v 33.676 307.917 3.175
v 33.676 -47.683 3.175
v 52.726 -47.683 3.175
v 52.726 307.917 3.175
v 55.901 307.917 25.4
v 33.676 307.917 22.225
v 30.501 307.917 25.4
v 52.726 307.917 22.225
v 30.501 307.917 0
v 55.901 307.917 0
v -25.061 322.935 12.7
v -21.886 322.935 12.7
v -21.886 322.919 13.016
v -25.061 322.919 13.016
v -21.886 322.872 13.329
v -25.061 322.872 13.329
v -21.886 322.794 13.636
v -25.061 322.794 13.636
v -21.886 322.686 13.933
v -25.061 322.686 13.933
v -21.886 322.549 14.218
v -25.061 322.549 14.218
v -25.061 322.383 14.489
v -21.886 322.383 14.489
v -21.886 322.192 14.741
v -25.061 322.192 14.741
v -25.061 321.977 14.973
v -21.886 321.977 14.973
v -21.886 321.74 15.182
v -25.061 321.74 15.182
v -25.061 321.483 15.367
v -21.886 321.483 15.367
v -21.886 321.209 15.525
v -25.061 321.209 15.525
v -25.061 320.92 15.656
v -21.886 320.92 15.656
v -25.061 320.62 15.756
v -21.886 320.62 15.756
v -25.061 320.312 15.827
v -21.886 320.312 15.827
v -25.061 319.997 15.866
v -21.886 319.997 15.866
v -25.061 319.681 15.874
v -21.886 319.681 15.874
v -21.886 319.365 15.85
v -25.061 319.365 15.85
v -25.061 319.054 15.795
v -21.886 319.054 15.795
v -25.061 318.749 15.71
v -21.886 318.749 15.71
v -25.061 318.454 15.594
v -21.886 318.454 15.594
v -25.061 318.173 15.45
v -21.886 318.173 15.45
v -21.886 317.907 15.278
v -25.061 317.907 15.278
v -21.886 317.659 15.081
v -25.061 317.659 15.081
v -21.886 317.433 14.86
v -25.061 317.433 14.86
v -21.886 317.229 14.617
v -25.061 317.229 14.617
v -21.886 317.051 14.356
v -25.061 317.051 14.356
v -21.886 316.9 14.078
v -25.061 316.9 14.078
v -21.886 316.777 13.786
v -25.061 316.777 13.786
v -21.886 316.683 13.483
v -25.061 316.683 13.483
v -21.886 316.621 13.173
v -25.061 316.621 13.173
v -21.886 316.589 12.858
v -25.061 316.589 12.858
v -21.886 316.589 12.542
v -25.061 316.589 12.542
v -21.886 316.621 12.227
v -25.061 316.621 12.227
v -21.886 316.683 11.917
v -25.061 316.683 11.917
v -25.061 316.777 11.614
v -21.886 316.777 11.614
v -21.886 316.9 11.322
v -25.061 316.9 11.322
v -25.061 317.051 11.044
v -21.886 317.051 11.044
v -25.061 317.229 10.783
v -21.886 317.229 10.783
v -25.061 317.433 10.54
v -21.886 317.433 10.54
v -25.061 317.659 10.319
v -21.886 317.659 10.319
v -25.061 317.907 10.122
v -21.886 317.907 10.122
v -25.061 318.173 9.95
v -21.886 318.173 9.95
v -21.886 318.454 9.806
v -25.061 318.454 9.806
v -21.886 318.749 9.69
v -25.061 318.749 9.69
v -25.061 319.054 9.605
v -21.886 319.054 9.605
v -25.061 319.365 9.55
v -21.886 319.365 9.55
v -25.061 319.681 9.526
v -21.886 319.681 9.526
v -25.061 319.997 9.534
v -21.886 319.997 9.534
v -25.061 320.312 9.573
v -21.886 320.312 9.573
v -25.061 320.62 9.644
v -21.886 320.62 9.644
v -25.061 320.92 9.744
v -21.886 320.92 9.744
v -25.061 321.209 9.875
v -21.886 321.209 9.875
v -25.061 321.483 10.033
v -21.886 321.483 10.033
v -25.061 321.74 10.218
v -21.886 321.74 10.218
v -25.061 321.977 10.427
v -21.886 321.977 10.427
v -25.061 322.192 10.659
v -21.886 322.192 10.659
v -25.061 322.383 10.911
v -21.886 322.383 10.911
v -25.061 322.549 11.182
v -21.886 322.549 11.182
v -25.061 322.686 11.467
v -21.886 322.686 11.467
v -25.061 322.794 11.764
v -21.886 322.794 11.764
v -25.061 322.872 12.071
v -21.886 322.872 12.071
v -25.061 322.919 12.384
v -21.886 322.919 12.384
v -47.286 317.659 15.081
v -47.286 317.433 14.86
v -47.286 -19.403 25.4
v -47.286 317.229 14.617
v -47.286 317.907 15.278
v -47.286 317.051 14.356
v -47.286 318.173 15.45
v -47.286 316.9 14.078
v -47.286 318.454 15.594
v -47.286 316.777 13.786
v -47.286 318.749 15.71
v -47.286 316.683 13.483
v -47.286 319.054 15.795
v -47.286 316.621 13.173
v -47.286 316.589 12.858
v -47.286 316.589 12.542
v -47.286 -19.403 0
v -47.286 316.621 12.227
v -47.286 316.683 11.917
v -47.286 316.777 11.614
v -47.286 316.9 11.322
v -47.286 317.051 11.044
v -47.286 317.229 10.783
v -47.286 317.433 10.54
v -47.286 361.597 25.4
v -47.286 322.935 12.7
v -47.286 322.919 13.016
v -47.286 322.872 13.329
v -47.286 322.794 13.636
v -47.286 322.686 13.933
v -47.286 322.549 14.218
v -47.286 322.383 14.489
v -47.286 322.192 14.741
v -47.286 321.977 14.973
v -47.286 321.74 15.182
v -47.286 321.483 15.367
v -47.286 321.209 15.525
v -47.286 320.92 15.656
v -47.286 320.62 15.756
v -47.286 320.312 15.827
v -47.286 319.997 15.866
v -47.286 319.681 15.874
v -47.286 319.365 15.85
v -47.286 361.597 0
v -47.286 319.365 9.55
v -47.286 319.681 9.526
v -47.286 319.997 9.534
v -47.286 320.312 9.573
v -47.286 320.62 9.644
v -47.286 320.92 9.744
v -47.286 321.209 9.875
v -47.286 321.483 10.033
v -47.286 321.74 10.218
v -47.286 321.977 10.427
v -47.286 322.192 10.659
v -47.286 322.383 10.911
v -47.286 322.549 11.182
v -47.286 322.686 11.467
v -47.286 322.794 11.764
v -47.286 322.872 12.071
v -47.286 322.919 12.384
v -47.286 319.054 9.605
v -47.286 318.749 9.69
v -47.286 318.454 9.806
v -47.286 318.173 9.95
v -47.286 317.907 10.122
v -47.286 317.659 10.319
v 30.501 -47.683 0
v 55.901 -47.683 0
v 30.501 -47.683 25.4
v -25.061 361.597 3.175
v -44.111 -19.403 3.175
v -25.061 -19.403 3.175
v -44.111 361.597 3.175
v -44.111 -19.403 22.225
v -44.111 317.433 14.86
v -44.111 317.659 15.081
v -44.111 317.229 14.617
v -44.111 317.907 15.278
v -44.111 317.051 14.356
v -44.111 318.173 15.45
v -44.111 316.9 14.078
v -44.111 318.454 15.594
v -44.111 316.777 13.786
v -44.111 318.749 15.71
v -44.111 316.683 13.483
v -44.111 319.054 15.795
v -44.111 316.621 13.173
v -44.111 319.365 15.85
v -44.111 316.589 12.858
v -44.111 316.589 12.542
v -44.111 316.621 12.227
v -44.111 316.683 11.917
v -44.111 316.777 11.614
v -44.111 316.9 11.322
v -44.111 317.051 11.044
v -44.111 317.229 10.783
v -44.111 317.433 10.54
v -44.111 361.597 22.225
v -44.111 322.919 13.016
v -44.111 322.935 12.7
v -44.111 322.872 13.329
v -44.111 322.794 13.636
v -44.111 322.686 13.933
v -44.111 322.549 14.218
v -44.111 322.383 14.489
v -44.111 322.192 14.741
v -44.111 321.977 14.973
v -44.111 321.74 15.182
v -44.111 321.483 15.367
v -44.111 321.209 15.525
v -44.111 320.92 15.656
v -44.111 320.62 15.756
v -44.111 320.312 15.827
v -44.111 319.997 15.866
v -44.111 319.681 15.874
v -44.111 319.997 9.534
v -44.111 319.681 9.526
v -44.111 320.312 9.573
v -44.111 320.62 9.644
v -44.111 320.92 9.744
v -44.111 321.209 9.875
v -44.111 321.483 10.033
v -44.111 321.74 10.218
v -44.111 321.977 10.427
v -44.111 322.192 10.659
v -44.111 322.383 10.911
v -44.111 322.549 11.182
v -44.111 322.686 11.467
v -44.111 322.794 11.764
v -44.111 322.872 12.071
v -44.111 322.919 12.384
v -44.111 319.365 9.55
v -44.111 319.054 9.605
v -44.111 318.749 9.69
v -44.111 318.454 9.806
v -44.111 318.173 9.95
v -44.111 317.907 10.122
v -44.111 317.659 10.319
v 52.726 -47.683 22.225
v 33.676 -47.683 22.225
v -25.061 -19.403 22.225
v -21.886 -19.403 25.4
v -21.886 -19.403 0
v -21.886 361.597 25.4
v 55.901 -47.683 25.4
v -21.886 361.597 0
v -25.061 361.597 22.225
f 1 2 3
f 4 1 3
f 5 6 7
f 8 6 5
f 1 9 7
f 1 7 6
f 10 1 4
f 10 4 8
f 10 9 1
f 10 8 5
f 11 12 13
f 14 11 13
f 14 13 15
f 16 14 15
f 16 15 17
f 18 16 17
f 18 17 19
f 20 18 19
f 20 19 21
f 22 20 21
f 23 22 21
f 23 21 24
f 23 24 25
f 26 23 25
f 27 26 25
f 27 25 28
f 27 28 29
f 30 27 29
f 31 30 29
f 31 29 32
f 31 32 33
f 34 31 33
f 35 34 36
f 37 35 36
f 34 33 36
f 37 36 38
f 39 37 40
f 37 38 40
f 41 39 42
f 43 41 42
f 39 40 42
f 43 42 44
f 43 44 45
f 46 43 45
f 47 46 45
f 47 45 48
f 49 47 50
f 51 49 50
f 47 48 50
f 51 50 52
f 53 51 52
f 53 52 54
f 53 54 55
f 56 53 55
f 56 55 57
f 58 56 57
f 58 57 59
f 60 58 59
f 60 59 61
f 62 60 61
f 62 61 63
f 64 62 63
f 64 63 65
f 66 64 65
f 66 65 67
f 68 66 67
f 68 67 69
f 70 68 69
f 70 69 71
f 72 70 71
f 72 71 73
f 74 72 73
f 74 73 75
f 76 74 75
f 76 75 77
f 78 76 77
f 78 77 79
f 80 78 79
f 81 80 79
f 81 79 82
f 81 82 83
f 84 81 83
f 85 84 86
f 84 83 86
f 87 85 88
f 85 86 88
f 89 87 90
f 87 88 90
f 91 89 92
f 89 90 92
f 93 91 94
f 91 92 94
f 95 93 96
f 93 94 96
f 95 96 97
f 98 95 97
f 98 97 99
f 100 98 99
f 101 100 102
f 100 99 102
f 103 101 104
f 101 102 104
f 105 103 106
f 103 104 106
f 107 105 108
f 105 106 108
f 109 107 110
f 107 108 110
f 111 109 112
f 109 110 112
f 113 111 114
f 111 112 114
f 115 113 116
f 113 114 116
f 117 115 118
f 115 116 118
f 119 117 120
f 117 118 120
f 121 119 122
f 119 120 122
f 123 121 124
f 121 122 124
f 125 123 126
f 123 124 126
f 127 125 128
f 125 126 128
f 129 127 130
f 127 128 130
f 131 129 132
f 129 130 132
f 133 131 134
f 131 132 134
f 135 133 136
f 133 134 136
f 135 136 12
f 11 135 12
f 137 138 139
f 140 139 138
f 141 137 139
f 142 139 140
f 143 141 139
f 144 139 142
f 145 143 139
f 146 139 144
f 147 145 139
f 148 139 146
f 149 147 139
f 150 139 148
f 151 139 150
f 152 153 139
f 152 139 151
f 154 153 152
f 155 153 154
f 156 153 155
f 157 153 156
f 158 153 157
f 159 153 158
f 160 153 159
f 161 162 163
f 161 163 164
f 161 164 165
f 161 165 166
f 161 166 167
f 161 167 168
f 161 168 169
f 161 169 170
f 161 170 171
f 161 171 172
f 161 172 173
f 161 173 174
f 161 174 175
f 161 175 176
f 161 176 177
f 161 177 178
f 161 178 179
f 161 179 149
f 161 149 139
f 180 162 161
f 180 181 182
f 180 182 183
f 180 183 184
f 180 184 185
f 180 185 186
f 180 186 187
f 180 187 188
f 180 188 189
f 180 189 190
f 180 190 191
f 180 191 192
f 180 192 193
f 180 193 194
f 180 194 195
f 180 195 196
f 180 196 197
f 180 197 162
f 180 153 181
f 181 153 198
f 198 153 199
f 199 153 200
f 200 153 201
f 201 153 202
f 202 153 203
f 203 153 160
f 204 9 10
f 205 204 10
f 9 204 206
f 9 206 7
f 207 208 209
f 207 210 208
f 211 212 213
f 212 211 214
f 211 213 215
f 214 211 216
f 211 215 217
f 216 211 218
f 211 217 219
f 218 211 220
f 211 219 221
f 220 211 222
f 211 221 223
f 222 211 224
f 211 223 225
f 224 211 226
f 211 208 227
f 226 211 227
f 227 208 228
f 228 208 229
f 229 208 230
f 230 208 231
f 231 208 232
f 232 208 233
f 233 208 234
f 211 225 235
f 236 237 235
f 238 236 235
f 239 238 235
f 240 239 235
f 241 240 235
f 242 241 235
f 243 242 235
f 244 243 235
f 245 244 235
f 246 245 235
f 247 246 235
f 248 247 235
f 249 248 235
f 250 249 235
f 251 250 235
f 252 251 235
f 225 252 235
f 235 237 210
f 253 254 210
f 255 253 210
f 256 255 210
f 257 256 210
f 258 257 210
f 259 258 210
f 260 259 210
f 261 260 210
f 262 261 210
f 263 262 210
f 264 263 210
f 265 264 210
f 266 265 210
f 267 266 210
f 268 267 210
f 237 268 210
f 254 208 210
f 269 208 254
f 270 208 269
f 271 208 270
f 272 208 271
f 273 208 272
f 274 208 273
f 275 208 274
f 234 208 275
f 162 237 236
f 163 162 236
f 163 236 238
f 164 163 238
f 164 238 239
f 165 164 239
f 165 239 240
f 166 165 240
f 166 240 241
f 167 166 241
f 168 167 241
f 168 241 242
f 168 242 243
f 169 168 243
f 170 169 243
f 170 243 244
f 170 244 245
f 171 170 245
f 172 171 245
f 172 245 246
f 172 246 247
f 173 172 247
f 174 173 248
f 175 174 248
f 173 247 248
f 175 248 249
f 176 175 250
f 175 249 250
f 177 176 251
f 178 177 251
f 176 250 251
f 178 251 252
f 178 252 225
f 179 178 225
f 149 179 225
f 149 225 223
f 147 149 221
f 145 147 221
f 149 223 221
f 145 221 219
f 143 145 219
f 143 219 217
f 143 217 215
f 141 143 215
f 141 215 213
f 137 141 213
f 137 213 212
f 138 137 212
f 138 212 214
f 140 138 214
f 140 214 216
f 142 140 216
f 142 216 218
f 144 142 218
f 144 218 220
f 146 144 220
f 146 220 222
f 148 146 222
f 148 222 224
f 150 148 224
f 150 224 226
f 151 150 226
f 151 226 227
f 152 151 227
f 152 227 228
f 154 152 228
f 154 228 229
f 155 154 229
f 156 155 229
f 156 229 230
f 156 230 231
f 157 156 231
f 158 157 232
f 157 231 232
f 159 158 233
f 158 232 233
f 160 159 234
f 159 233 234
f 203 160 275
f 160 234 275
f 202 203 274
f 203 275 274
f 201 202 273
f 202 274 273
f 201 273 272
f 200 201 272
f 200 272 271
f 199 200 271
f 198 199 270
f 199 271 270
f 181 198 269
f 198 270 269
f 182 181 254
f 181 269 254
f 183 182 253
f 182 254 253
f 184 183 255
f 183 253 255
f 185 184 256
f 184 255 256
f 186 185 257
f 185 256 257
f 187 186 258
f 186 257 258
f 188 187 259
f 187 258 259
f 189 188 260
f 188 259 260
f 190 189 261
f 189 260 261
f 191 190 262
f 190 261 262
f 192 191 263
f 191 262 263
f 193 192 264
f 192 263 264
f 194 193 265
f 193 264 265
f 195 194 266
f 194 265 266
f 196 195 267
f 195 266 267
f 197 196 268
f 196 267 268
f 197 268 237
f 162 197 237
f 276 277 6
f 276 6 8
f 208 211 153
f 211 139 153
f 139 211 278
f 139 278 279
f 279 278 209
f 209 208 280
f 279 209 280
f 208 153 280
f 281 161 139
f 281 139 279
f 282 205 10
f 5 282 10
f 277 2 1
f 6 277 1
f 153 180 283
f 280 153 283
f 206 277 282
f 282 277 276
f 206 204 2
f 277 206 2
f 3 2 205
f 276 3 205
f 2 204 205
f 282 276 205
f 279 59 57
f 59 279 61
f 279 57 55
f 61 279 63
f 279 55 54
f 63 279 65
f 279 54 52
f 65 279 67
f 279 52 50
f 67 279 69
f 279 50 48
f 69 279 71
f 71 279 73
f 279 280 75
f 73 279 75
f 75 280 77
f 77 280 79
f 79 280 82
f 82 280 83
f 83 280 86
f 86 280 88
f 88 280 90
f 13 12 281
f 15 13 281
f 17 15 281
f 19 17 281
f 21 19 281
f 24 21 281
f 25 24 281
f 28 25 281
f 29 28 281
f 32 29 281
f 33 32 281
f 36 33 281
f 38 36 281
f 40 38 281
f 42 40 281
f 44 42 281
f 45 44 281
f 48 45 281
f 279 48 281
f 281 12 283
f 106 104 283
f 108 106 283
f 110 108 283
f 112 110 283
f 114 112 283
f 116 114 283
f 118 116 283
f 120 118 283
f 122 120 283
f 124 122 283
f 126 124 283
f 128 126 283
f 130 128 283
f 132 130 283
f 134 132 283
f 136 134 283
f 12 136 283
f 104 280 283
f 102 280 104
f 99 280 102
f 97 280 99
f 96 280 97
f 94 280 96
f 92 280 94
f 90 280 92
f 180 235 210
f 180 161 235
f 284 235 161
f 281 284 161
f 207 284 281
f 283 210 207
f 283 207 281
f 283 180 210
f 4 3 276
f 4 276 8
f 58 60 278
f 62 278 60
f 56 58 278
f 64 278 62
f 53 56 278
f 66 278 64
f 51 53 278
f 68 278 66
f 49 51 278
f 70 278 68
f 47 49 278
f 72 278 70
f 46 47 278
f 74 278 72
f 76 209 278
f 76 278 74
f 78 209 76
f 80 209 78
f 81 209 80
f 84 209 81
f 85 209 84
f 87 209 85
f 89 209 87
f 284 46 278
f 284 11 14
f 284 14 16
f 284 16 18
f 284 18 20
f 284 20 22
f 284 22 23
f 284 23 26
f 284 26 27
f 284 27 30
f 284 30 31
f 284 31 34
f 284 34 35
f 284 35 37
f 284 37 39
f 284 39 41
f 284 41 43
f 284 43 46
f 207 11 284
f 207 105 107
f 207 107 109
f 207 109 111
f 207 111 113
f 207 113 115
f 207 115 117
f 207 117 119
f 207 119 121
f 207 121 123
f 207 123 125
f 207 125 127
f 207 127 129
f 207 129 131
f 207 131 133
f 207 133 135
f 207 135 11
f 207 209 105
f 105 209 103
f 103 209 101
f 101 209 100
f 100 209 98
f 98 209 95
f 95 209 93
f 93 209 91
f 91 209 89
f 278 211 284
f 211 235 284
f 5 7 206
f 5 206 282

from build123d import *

# Parameters (mm, degrees)
F0_W     = 25.4
F0_H     = 381
F1_DEPTH = 25.4
F0_H_2   = 355.6
F2_T     = -3.175
F2_2_T   = -3.175
F4_D     = 6.35


with BuildPart() as f1:
    # F0 (on Top) → F1 (new body)
    with BuildSketch(Plane.XY):
        with Locations((-34.586421214, 171.0971277789)):
            Rectangle(F0_W, F0_H)
    extrude(amount=F1_DEPTH)

    # F2
    f2_openings = [f1.faces().sort_by_distance(p)[0] for p in [
        (-34.586421, -19.402872, 12.7),
        (-34.586421, 361.597128, 12.7),
    ]]
    offset(amount=F2_T, openings=f2_openings)

    # F4 (through all)
    with Locations(Plane(origin=(-47.286421214, 0, 0), x_dir=(0, -1, 0), z_dir=(-1, 0, 0))):
        with Locations((-319.7601735592, 12.7)):
            Hole(F4_D / 2)


with BuildPart() as f1b:
    # F0 (on Top) → F1, piece 2 (new body)
    with BuildSketch(Plane.XY):
        with Locations((43.2012185127, 130.117468822)):
            Rectangle(F0_W, F0_H_2)
    extrude(amount=F1_DEPTH)

    # F2#2
    f2_2_openings = [f1b.faces().sort_by_distance(p)[0] for p in [
        (43.201219, -47.682531, 12.7),
        (43.201219, 307.917469, 12.7),
    ]]
    offset(amount=F2_2_T, openings=f2_2_openings)


solid = Compound([f1.part, f1b.part])
